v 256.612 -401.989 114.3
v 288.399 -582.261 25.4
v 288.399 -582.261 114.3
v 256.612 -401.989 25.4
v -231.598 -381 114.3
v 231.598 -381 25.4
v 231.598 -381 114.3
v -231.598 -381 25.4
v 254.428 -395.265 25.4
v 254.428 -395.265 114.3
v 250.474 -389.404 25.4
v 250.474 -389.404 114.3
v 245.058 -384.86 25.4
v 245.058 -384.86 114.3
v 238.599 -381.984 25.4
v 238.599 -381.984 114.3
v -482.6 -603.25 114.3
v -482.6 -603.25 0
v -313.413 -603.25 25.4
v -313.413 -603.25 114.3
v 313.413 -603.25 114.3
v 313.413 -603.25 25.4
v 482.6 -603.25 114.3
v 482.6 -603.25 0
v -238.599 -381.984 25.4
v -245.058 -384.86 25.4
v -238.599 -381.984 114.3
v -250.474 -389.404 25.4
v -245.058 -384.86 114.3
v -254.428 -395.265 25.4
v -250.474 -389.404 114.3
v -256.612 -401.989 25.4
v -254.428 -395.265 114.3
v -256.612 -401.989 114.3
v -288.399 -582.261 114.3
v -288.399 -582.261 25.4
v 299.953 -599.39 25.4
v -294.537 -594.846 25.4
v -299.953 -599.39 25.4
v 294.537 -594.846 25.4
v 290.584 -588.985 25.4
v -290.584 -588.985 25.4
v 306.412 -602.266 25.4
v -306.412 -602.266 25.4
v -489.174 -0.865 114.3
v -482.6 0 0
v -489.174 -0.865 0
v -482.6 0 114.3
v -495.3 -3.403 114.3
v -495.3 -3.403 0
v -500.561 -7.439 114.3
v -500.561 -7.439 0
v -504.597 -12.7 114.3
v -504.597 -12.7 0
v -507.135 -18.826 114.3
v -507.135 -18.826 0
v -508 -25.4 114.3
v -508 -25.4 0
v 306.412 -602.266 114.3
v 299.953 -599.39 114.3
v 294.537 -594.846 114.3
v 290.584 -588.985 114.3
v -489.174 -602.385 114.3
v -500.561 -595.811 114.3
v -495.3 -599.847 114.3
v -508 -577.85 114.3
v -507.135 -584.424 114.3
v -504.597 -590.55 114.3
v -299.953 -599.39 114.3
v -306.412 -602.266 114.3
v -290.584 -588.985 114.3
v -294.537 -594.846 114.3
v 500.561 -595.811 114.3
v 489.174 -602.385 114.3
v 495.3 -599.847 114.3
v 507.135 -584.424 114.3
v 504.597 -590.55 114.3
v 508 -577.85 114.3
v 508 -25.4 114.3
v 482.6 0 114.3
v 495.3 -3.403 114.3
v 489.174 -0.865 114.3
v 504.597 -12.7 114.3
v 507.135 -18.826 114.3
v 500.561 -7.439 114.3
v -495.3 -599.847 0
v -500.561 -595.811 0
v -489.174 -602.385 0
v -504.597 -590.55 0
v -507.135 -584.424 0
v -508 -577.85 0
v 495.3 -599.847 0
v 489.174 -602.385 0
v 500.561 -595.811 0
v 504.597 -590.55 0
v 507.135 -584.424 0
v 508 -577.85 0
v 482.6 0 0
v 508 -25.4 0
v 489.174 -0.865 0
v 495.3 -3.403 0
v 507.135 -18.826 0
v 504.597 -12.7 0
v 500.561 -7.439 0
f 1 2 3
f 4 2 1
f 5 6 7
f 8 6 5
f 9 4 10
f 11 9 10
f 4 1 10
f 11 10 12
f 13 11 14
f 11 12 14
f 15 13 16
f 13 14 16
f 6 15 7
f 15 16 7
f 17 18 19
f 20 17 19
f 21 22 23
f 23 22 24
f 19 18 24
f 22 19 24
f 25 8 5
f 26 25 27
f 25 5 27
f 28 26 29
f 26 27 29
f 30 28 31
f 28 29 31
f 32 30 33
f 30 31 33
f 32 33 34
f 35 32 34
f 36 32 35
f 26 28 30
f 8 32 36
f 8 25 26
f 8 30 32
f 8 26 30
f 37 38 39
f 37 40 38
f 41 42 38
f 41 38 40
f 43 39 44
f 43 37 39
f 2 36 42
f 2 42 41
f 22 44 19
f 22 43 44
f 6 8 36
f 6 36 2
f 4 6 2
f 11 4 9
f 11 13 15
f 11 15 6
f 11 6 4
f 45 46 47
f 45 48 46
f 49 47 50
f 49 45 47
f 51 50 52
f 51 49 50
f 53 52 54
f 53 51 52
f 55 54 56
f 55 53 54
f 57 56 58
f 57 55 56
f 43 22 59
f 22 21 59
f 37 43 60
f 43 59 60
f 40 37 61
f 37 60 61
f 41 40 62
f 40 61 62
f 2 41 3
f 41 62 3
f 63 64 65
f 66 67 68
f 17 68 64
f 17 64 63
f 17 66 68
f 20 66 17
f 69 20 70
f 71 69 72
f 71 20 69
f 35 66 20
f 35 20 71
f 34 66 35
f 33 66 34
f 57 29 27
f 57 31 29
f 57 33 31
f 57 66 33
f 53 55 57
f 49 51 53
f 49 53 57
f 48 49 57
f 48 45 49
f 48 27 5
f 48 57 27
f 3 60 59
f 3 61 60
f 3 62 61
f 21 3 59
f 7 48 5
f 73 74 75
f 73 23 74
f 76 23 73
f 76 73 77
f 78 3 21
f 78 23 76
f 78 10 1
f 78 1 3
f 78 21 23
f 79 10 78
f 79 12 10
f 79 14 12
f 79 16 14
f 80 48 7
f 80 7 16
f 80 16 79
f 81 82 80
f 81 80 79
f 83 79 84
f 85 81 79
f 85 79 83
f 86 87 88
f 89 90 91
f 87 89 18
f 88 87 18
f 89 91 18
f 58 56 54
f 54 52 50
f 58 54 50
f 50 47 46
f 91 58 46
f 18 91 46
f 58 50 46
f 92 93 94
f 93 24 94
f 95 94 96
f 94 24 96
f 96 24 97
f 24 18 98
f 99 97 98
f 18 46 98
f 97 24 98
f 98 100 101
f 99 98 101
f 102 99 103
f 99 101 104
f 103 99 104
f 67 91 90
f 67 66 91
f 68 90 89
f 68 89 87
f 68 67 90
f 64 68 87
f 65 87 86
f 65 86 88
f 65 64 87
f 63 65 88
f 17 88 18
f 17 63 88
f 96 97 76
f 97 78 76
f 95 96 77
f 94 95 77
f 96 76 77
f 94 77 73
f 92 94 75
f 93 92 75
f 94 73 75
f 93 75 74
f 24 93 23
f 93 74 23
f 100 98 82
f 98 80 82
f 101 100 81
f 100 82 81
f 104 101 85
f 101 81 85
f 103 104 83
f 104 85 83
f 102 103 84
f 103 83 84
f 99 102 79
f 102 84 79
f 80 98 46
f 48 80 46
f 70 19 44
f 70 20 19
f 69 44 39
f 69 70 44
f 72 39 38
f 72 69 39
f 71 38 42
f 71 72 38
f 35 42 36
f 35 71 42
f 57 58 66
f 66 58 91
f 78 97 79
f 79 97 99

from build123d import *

# Parameters (mm, degrees)
F1_DEPTH = 114.3
F2_START = 25.4
F2_DEPTH = 88.901
F3_R     = 25.4


with BuildPart() as f1:
    # F0 (on Top) → F1 (new body)
    with BuildSketch(Plane.XY):
        Polygon((508, 0), (-508, 0), (-508, -603.25), (-292.1, -603.25), (-252.9113285375, -381), (252.9113285375, -381), (292.1, -603.25), (508, -603.25), align=None)
        Polygon((-252.9113285375, -381), (-292.1, -603.25), (292.1, -603.25), (252.9113285375, -381), align=None)
    extrude(amount=F1_DEPTH)

    # F0 (on Top) → F2 (cut)
    with BuildSketch(Plane.XY.offset(F2_START)):
        Polygon((-252.9113285375, -381), (-292.1, -603.25), (292.1, -603.25), (252.9113285375, -381), align=None)
    extrude(amount=F2_DEPTH, mode=Mode.SUBTRACT)

    # F3
    f3_edges = [f1.edges().sort_by_distance(p)[0] for p in [
        (-508, -603.25, 57.15),
        (508, -603.25, 57.15),
        (-292.1, -603.25, 69.85),
        (-252.911329, -381, 69.85),
        (292.1, -603.25, 69.85),
        (508, 0, 57.15),
        (252.911329, -381, 69.85),
        (-508, 0, 57.15),
    ]]
    fillet(f3_edges, radius=F3_R)


solid = f1.part
